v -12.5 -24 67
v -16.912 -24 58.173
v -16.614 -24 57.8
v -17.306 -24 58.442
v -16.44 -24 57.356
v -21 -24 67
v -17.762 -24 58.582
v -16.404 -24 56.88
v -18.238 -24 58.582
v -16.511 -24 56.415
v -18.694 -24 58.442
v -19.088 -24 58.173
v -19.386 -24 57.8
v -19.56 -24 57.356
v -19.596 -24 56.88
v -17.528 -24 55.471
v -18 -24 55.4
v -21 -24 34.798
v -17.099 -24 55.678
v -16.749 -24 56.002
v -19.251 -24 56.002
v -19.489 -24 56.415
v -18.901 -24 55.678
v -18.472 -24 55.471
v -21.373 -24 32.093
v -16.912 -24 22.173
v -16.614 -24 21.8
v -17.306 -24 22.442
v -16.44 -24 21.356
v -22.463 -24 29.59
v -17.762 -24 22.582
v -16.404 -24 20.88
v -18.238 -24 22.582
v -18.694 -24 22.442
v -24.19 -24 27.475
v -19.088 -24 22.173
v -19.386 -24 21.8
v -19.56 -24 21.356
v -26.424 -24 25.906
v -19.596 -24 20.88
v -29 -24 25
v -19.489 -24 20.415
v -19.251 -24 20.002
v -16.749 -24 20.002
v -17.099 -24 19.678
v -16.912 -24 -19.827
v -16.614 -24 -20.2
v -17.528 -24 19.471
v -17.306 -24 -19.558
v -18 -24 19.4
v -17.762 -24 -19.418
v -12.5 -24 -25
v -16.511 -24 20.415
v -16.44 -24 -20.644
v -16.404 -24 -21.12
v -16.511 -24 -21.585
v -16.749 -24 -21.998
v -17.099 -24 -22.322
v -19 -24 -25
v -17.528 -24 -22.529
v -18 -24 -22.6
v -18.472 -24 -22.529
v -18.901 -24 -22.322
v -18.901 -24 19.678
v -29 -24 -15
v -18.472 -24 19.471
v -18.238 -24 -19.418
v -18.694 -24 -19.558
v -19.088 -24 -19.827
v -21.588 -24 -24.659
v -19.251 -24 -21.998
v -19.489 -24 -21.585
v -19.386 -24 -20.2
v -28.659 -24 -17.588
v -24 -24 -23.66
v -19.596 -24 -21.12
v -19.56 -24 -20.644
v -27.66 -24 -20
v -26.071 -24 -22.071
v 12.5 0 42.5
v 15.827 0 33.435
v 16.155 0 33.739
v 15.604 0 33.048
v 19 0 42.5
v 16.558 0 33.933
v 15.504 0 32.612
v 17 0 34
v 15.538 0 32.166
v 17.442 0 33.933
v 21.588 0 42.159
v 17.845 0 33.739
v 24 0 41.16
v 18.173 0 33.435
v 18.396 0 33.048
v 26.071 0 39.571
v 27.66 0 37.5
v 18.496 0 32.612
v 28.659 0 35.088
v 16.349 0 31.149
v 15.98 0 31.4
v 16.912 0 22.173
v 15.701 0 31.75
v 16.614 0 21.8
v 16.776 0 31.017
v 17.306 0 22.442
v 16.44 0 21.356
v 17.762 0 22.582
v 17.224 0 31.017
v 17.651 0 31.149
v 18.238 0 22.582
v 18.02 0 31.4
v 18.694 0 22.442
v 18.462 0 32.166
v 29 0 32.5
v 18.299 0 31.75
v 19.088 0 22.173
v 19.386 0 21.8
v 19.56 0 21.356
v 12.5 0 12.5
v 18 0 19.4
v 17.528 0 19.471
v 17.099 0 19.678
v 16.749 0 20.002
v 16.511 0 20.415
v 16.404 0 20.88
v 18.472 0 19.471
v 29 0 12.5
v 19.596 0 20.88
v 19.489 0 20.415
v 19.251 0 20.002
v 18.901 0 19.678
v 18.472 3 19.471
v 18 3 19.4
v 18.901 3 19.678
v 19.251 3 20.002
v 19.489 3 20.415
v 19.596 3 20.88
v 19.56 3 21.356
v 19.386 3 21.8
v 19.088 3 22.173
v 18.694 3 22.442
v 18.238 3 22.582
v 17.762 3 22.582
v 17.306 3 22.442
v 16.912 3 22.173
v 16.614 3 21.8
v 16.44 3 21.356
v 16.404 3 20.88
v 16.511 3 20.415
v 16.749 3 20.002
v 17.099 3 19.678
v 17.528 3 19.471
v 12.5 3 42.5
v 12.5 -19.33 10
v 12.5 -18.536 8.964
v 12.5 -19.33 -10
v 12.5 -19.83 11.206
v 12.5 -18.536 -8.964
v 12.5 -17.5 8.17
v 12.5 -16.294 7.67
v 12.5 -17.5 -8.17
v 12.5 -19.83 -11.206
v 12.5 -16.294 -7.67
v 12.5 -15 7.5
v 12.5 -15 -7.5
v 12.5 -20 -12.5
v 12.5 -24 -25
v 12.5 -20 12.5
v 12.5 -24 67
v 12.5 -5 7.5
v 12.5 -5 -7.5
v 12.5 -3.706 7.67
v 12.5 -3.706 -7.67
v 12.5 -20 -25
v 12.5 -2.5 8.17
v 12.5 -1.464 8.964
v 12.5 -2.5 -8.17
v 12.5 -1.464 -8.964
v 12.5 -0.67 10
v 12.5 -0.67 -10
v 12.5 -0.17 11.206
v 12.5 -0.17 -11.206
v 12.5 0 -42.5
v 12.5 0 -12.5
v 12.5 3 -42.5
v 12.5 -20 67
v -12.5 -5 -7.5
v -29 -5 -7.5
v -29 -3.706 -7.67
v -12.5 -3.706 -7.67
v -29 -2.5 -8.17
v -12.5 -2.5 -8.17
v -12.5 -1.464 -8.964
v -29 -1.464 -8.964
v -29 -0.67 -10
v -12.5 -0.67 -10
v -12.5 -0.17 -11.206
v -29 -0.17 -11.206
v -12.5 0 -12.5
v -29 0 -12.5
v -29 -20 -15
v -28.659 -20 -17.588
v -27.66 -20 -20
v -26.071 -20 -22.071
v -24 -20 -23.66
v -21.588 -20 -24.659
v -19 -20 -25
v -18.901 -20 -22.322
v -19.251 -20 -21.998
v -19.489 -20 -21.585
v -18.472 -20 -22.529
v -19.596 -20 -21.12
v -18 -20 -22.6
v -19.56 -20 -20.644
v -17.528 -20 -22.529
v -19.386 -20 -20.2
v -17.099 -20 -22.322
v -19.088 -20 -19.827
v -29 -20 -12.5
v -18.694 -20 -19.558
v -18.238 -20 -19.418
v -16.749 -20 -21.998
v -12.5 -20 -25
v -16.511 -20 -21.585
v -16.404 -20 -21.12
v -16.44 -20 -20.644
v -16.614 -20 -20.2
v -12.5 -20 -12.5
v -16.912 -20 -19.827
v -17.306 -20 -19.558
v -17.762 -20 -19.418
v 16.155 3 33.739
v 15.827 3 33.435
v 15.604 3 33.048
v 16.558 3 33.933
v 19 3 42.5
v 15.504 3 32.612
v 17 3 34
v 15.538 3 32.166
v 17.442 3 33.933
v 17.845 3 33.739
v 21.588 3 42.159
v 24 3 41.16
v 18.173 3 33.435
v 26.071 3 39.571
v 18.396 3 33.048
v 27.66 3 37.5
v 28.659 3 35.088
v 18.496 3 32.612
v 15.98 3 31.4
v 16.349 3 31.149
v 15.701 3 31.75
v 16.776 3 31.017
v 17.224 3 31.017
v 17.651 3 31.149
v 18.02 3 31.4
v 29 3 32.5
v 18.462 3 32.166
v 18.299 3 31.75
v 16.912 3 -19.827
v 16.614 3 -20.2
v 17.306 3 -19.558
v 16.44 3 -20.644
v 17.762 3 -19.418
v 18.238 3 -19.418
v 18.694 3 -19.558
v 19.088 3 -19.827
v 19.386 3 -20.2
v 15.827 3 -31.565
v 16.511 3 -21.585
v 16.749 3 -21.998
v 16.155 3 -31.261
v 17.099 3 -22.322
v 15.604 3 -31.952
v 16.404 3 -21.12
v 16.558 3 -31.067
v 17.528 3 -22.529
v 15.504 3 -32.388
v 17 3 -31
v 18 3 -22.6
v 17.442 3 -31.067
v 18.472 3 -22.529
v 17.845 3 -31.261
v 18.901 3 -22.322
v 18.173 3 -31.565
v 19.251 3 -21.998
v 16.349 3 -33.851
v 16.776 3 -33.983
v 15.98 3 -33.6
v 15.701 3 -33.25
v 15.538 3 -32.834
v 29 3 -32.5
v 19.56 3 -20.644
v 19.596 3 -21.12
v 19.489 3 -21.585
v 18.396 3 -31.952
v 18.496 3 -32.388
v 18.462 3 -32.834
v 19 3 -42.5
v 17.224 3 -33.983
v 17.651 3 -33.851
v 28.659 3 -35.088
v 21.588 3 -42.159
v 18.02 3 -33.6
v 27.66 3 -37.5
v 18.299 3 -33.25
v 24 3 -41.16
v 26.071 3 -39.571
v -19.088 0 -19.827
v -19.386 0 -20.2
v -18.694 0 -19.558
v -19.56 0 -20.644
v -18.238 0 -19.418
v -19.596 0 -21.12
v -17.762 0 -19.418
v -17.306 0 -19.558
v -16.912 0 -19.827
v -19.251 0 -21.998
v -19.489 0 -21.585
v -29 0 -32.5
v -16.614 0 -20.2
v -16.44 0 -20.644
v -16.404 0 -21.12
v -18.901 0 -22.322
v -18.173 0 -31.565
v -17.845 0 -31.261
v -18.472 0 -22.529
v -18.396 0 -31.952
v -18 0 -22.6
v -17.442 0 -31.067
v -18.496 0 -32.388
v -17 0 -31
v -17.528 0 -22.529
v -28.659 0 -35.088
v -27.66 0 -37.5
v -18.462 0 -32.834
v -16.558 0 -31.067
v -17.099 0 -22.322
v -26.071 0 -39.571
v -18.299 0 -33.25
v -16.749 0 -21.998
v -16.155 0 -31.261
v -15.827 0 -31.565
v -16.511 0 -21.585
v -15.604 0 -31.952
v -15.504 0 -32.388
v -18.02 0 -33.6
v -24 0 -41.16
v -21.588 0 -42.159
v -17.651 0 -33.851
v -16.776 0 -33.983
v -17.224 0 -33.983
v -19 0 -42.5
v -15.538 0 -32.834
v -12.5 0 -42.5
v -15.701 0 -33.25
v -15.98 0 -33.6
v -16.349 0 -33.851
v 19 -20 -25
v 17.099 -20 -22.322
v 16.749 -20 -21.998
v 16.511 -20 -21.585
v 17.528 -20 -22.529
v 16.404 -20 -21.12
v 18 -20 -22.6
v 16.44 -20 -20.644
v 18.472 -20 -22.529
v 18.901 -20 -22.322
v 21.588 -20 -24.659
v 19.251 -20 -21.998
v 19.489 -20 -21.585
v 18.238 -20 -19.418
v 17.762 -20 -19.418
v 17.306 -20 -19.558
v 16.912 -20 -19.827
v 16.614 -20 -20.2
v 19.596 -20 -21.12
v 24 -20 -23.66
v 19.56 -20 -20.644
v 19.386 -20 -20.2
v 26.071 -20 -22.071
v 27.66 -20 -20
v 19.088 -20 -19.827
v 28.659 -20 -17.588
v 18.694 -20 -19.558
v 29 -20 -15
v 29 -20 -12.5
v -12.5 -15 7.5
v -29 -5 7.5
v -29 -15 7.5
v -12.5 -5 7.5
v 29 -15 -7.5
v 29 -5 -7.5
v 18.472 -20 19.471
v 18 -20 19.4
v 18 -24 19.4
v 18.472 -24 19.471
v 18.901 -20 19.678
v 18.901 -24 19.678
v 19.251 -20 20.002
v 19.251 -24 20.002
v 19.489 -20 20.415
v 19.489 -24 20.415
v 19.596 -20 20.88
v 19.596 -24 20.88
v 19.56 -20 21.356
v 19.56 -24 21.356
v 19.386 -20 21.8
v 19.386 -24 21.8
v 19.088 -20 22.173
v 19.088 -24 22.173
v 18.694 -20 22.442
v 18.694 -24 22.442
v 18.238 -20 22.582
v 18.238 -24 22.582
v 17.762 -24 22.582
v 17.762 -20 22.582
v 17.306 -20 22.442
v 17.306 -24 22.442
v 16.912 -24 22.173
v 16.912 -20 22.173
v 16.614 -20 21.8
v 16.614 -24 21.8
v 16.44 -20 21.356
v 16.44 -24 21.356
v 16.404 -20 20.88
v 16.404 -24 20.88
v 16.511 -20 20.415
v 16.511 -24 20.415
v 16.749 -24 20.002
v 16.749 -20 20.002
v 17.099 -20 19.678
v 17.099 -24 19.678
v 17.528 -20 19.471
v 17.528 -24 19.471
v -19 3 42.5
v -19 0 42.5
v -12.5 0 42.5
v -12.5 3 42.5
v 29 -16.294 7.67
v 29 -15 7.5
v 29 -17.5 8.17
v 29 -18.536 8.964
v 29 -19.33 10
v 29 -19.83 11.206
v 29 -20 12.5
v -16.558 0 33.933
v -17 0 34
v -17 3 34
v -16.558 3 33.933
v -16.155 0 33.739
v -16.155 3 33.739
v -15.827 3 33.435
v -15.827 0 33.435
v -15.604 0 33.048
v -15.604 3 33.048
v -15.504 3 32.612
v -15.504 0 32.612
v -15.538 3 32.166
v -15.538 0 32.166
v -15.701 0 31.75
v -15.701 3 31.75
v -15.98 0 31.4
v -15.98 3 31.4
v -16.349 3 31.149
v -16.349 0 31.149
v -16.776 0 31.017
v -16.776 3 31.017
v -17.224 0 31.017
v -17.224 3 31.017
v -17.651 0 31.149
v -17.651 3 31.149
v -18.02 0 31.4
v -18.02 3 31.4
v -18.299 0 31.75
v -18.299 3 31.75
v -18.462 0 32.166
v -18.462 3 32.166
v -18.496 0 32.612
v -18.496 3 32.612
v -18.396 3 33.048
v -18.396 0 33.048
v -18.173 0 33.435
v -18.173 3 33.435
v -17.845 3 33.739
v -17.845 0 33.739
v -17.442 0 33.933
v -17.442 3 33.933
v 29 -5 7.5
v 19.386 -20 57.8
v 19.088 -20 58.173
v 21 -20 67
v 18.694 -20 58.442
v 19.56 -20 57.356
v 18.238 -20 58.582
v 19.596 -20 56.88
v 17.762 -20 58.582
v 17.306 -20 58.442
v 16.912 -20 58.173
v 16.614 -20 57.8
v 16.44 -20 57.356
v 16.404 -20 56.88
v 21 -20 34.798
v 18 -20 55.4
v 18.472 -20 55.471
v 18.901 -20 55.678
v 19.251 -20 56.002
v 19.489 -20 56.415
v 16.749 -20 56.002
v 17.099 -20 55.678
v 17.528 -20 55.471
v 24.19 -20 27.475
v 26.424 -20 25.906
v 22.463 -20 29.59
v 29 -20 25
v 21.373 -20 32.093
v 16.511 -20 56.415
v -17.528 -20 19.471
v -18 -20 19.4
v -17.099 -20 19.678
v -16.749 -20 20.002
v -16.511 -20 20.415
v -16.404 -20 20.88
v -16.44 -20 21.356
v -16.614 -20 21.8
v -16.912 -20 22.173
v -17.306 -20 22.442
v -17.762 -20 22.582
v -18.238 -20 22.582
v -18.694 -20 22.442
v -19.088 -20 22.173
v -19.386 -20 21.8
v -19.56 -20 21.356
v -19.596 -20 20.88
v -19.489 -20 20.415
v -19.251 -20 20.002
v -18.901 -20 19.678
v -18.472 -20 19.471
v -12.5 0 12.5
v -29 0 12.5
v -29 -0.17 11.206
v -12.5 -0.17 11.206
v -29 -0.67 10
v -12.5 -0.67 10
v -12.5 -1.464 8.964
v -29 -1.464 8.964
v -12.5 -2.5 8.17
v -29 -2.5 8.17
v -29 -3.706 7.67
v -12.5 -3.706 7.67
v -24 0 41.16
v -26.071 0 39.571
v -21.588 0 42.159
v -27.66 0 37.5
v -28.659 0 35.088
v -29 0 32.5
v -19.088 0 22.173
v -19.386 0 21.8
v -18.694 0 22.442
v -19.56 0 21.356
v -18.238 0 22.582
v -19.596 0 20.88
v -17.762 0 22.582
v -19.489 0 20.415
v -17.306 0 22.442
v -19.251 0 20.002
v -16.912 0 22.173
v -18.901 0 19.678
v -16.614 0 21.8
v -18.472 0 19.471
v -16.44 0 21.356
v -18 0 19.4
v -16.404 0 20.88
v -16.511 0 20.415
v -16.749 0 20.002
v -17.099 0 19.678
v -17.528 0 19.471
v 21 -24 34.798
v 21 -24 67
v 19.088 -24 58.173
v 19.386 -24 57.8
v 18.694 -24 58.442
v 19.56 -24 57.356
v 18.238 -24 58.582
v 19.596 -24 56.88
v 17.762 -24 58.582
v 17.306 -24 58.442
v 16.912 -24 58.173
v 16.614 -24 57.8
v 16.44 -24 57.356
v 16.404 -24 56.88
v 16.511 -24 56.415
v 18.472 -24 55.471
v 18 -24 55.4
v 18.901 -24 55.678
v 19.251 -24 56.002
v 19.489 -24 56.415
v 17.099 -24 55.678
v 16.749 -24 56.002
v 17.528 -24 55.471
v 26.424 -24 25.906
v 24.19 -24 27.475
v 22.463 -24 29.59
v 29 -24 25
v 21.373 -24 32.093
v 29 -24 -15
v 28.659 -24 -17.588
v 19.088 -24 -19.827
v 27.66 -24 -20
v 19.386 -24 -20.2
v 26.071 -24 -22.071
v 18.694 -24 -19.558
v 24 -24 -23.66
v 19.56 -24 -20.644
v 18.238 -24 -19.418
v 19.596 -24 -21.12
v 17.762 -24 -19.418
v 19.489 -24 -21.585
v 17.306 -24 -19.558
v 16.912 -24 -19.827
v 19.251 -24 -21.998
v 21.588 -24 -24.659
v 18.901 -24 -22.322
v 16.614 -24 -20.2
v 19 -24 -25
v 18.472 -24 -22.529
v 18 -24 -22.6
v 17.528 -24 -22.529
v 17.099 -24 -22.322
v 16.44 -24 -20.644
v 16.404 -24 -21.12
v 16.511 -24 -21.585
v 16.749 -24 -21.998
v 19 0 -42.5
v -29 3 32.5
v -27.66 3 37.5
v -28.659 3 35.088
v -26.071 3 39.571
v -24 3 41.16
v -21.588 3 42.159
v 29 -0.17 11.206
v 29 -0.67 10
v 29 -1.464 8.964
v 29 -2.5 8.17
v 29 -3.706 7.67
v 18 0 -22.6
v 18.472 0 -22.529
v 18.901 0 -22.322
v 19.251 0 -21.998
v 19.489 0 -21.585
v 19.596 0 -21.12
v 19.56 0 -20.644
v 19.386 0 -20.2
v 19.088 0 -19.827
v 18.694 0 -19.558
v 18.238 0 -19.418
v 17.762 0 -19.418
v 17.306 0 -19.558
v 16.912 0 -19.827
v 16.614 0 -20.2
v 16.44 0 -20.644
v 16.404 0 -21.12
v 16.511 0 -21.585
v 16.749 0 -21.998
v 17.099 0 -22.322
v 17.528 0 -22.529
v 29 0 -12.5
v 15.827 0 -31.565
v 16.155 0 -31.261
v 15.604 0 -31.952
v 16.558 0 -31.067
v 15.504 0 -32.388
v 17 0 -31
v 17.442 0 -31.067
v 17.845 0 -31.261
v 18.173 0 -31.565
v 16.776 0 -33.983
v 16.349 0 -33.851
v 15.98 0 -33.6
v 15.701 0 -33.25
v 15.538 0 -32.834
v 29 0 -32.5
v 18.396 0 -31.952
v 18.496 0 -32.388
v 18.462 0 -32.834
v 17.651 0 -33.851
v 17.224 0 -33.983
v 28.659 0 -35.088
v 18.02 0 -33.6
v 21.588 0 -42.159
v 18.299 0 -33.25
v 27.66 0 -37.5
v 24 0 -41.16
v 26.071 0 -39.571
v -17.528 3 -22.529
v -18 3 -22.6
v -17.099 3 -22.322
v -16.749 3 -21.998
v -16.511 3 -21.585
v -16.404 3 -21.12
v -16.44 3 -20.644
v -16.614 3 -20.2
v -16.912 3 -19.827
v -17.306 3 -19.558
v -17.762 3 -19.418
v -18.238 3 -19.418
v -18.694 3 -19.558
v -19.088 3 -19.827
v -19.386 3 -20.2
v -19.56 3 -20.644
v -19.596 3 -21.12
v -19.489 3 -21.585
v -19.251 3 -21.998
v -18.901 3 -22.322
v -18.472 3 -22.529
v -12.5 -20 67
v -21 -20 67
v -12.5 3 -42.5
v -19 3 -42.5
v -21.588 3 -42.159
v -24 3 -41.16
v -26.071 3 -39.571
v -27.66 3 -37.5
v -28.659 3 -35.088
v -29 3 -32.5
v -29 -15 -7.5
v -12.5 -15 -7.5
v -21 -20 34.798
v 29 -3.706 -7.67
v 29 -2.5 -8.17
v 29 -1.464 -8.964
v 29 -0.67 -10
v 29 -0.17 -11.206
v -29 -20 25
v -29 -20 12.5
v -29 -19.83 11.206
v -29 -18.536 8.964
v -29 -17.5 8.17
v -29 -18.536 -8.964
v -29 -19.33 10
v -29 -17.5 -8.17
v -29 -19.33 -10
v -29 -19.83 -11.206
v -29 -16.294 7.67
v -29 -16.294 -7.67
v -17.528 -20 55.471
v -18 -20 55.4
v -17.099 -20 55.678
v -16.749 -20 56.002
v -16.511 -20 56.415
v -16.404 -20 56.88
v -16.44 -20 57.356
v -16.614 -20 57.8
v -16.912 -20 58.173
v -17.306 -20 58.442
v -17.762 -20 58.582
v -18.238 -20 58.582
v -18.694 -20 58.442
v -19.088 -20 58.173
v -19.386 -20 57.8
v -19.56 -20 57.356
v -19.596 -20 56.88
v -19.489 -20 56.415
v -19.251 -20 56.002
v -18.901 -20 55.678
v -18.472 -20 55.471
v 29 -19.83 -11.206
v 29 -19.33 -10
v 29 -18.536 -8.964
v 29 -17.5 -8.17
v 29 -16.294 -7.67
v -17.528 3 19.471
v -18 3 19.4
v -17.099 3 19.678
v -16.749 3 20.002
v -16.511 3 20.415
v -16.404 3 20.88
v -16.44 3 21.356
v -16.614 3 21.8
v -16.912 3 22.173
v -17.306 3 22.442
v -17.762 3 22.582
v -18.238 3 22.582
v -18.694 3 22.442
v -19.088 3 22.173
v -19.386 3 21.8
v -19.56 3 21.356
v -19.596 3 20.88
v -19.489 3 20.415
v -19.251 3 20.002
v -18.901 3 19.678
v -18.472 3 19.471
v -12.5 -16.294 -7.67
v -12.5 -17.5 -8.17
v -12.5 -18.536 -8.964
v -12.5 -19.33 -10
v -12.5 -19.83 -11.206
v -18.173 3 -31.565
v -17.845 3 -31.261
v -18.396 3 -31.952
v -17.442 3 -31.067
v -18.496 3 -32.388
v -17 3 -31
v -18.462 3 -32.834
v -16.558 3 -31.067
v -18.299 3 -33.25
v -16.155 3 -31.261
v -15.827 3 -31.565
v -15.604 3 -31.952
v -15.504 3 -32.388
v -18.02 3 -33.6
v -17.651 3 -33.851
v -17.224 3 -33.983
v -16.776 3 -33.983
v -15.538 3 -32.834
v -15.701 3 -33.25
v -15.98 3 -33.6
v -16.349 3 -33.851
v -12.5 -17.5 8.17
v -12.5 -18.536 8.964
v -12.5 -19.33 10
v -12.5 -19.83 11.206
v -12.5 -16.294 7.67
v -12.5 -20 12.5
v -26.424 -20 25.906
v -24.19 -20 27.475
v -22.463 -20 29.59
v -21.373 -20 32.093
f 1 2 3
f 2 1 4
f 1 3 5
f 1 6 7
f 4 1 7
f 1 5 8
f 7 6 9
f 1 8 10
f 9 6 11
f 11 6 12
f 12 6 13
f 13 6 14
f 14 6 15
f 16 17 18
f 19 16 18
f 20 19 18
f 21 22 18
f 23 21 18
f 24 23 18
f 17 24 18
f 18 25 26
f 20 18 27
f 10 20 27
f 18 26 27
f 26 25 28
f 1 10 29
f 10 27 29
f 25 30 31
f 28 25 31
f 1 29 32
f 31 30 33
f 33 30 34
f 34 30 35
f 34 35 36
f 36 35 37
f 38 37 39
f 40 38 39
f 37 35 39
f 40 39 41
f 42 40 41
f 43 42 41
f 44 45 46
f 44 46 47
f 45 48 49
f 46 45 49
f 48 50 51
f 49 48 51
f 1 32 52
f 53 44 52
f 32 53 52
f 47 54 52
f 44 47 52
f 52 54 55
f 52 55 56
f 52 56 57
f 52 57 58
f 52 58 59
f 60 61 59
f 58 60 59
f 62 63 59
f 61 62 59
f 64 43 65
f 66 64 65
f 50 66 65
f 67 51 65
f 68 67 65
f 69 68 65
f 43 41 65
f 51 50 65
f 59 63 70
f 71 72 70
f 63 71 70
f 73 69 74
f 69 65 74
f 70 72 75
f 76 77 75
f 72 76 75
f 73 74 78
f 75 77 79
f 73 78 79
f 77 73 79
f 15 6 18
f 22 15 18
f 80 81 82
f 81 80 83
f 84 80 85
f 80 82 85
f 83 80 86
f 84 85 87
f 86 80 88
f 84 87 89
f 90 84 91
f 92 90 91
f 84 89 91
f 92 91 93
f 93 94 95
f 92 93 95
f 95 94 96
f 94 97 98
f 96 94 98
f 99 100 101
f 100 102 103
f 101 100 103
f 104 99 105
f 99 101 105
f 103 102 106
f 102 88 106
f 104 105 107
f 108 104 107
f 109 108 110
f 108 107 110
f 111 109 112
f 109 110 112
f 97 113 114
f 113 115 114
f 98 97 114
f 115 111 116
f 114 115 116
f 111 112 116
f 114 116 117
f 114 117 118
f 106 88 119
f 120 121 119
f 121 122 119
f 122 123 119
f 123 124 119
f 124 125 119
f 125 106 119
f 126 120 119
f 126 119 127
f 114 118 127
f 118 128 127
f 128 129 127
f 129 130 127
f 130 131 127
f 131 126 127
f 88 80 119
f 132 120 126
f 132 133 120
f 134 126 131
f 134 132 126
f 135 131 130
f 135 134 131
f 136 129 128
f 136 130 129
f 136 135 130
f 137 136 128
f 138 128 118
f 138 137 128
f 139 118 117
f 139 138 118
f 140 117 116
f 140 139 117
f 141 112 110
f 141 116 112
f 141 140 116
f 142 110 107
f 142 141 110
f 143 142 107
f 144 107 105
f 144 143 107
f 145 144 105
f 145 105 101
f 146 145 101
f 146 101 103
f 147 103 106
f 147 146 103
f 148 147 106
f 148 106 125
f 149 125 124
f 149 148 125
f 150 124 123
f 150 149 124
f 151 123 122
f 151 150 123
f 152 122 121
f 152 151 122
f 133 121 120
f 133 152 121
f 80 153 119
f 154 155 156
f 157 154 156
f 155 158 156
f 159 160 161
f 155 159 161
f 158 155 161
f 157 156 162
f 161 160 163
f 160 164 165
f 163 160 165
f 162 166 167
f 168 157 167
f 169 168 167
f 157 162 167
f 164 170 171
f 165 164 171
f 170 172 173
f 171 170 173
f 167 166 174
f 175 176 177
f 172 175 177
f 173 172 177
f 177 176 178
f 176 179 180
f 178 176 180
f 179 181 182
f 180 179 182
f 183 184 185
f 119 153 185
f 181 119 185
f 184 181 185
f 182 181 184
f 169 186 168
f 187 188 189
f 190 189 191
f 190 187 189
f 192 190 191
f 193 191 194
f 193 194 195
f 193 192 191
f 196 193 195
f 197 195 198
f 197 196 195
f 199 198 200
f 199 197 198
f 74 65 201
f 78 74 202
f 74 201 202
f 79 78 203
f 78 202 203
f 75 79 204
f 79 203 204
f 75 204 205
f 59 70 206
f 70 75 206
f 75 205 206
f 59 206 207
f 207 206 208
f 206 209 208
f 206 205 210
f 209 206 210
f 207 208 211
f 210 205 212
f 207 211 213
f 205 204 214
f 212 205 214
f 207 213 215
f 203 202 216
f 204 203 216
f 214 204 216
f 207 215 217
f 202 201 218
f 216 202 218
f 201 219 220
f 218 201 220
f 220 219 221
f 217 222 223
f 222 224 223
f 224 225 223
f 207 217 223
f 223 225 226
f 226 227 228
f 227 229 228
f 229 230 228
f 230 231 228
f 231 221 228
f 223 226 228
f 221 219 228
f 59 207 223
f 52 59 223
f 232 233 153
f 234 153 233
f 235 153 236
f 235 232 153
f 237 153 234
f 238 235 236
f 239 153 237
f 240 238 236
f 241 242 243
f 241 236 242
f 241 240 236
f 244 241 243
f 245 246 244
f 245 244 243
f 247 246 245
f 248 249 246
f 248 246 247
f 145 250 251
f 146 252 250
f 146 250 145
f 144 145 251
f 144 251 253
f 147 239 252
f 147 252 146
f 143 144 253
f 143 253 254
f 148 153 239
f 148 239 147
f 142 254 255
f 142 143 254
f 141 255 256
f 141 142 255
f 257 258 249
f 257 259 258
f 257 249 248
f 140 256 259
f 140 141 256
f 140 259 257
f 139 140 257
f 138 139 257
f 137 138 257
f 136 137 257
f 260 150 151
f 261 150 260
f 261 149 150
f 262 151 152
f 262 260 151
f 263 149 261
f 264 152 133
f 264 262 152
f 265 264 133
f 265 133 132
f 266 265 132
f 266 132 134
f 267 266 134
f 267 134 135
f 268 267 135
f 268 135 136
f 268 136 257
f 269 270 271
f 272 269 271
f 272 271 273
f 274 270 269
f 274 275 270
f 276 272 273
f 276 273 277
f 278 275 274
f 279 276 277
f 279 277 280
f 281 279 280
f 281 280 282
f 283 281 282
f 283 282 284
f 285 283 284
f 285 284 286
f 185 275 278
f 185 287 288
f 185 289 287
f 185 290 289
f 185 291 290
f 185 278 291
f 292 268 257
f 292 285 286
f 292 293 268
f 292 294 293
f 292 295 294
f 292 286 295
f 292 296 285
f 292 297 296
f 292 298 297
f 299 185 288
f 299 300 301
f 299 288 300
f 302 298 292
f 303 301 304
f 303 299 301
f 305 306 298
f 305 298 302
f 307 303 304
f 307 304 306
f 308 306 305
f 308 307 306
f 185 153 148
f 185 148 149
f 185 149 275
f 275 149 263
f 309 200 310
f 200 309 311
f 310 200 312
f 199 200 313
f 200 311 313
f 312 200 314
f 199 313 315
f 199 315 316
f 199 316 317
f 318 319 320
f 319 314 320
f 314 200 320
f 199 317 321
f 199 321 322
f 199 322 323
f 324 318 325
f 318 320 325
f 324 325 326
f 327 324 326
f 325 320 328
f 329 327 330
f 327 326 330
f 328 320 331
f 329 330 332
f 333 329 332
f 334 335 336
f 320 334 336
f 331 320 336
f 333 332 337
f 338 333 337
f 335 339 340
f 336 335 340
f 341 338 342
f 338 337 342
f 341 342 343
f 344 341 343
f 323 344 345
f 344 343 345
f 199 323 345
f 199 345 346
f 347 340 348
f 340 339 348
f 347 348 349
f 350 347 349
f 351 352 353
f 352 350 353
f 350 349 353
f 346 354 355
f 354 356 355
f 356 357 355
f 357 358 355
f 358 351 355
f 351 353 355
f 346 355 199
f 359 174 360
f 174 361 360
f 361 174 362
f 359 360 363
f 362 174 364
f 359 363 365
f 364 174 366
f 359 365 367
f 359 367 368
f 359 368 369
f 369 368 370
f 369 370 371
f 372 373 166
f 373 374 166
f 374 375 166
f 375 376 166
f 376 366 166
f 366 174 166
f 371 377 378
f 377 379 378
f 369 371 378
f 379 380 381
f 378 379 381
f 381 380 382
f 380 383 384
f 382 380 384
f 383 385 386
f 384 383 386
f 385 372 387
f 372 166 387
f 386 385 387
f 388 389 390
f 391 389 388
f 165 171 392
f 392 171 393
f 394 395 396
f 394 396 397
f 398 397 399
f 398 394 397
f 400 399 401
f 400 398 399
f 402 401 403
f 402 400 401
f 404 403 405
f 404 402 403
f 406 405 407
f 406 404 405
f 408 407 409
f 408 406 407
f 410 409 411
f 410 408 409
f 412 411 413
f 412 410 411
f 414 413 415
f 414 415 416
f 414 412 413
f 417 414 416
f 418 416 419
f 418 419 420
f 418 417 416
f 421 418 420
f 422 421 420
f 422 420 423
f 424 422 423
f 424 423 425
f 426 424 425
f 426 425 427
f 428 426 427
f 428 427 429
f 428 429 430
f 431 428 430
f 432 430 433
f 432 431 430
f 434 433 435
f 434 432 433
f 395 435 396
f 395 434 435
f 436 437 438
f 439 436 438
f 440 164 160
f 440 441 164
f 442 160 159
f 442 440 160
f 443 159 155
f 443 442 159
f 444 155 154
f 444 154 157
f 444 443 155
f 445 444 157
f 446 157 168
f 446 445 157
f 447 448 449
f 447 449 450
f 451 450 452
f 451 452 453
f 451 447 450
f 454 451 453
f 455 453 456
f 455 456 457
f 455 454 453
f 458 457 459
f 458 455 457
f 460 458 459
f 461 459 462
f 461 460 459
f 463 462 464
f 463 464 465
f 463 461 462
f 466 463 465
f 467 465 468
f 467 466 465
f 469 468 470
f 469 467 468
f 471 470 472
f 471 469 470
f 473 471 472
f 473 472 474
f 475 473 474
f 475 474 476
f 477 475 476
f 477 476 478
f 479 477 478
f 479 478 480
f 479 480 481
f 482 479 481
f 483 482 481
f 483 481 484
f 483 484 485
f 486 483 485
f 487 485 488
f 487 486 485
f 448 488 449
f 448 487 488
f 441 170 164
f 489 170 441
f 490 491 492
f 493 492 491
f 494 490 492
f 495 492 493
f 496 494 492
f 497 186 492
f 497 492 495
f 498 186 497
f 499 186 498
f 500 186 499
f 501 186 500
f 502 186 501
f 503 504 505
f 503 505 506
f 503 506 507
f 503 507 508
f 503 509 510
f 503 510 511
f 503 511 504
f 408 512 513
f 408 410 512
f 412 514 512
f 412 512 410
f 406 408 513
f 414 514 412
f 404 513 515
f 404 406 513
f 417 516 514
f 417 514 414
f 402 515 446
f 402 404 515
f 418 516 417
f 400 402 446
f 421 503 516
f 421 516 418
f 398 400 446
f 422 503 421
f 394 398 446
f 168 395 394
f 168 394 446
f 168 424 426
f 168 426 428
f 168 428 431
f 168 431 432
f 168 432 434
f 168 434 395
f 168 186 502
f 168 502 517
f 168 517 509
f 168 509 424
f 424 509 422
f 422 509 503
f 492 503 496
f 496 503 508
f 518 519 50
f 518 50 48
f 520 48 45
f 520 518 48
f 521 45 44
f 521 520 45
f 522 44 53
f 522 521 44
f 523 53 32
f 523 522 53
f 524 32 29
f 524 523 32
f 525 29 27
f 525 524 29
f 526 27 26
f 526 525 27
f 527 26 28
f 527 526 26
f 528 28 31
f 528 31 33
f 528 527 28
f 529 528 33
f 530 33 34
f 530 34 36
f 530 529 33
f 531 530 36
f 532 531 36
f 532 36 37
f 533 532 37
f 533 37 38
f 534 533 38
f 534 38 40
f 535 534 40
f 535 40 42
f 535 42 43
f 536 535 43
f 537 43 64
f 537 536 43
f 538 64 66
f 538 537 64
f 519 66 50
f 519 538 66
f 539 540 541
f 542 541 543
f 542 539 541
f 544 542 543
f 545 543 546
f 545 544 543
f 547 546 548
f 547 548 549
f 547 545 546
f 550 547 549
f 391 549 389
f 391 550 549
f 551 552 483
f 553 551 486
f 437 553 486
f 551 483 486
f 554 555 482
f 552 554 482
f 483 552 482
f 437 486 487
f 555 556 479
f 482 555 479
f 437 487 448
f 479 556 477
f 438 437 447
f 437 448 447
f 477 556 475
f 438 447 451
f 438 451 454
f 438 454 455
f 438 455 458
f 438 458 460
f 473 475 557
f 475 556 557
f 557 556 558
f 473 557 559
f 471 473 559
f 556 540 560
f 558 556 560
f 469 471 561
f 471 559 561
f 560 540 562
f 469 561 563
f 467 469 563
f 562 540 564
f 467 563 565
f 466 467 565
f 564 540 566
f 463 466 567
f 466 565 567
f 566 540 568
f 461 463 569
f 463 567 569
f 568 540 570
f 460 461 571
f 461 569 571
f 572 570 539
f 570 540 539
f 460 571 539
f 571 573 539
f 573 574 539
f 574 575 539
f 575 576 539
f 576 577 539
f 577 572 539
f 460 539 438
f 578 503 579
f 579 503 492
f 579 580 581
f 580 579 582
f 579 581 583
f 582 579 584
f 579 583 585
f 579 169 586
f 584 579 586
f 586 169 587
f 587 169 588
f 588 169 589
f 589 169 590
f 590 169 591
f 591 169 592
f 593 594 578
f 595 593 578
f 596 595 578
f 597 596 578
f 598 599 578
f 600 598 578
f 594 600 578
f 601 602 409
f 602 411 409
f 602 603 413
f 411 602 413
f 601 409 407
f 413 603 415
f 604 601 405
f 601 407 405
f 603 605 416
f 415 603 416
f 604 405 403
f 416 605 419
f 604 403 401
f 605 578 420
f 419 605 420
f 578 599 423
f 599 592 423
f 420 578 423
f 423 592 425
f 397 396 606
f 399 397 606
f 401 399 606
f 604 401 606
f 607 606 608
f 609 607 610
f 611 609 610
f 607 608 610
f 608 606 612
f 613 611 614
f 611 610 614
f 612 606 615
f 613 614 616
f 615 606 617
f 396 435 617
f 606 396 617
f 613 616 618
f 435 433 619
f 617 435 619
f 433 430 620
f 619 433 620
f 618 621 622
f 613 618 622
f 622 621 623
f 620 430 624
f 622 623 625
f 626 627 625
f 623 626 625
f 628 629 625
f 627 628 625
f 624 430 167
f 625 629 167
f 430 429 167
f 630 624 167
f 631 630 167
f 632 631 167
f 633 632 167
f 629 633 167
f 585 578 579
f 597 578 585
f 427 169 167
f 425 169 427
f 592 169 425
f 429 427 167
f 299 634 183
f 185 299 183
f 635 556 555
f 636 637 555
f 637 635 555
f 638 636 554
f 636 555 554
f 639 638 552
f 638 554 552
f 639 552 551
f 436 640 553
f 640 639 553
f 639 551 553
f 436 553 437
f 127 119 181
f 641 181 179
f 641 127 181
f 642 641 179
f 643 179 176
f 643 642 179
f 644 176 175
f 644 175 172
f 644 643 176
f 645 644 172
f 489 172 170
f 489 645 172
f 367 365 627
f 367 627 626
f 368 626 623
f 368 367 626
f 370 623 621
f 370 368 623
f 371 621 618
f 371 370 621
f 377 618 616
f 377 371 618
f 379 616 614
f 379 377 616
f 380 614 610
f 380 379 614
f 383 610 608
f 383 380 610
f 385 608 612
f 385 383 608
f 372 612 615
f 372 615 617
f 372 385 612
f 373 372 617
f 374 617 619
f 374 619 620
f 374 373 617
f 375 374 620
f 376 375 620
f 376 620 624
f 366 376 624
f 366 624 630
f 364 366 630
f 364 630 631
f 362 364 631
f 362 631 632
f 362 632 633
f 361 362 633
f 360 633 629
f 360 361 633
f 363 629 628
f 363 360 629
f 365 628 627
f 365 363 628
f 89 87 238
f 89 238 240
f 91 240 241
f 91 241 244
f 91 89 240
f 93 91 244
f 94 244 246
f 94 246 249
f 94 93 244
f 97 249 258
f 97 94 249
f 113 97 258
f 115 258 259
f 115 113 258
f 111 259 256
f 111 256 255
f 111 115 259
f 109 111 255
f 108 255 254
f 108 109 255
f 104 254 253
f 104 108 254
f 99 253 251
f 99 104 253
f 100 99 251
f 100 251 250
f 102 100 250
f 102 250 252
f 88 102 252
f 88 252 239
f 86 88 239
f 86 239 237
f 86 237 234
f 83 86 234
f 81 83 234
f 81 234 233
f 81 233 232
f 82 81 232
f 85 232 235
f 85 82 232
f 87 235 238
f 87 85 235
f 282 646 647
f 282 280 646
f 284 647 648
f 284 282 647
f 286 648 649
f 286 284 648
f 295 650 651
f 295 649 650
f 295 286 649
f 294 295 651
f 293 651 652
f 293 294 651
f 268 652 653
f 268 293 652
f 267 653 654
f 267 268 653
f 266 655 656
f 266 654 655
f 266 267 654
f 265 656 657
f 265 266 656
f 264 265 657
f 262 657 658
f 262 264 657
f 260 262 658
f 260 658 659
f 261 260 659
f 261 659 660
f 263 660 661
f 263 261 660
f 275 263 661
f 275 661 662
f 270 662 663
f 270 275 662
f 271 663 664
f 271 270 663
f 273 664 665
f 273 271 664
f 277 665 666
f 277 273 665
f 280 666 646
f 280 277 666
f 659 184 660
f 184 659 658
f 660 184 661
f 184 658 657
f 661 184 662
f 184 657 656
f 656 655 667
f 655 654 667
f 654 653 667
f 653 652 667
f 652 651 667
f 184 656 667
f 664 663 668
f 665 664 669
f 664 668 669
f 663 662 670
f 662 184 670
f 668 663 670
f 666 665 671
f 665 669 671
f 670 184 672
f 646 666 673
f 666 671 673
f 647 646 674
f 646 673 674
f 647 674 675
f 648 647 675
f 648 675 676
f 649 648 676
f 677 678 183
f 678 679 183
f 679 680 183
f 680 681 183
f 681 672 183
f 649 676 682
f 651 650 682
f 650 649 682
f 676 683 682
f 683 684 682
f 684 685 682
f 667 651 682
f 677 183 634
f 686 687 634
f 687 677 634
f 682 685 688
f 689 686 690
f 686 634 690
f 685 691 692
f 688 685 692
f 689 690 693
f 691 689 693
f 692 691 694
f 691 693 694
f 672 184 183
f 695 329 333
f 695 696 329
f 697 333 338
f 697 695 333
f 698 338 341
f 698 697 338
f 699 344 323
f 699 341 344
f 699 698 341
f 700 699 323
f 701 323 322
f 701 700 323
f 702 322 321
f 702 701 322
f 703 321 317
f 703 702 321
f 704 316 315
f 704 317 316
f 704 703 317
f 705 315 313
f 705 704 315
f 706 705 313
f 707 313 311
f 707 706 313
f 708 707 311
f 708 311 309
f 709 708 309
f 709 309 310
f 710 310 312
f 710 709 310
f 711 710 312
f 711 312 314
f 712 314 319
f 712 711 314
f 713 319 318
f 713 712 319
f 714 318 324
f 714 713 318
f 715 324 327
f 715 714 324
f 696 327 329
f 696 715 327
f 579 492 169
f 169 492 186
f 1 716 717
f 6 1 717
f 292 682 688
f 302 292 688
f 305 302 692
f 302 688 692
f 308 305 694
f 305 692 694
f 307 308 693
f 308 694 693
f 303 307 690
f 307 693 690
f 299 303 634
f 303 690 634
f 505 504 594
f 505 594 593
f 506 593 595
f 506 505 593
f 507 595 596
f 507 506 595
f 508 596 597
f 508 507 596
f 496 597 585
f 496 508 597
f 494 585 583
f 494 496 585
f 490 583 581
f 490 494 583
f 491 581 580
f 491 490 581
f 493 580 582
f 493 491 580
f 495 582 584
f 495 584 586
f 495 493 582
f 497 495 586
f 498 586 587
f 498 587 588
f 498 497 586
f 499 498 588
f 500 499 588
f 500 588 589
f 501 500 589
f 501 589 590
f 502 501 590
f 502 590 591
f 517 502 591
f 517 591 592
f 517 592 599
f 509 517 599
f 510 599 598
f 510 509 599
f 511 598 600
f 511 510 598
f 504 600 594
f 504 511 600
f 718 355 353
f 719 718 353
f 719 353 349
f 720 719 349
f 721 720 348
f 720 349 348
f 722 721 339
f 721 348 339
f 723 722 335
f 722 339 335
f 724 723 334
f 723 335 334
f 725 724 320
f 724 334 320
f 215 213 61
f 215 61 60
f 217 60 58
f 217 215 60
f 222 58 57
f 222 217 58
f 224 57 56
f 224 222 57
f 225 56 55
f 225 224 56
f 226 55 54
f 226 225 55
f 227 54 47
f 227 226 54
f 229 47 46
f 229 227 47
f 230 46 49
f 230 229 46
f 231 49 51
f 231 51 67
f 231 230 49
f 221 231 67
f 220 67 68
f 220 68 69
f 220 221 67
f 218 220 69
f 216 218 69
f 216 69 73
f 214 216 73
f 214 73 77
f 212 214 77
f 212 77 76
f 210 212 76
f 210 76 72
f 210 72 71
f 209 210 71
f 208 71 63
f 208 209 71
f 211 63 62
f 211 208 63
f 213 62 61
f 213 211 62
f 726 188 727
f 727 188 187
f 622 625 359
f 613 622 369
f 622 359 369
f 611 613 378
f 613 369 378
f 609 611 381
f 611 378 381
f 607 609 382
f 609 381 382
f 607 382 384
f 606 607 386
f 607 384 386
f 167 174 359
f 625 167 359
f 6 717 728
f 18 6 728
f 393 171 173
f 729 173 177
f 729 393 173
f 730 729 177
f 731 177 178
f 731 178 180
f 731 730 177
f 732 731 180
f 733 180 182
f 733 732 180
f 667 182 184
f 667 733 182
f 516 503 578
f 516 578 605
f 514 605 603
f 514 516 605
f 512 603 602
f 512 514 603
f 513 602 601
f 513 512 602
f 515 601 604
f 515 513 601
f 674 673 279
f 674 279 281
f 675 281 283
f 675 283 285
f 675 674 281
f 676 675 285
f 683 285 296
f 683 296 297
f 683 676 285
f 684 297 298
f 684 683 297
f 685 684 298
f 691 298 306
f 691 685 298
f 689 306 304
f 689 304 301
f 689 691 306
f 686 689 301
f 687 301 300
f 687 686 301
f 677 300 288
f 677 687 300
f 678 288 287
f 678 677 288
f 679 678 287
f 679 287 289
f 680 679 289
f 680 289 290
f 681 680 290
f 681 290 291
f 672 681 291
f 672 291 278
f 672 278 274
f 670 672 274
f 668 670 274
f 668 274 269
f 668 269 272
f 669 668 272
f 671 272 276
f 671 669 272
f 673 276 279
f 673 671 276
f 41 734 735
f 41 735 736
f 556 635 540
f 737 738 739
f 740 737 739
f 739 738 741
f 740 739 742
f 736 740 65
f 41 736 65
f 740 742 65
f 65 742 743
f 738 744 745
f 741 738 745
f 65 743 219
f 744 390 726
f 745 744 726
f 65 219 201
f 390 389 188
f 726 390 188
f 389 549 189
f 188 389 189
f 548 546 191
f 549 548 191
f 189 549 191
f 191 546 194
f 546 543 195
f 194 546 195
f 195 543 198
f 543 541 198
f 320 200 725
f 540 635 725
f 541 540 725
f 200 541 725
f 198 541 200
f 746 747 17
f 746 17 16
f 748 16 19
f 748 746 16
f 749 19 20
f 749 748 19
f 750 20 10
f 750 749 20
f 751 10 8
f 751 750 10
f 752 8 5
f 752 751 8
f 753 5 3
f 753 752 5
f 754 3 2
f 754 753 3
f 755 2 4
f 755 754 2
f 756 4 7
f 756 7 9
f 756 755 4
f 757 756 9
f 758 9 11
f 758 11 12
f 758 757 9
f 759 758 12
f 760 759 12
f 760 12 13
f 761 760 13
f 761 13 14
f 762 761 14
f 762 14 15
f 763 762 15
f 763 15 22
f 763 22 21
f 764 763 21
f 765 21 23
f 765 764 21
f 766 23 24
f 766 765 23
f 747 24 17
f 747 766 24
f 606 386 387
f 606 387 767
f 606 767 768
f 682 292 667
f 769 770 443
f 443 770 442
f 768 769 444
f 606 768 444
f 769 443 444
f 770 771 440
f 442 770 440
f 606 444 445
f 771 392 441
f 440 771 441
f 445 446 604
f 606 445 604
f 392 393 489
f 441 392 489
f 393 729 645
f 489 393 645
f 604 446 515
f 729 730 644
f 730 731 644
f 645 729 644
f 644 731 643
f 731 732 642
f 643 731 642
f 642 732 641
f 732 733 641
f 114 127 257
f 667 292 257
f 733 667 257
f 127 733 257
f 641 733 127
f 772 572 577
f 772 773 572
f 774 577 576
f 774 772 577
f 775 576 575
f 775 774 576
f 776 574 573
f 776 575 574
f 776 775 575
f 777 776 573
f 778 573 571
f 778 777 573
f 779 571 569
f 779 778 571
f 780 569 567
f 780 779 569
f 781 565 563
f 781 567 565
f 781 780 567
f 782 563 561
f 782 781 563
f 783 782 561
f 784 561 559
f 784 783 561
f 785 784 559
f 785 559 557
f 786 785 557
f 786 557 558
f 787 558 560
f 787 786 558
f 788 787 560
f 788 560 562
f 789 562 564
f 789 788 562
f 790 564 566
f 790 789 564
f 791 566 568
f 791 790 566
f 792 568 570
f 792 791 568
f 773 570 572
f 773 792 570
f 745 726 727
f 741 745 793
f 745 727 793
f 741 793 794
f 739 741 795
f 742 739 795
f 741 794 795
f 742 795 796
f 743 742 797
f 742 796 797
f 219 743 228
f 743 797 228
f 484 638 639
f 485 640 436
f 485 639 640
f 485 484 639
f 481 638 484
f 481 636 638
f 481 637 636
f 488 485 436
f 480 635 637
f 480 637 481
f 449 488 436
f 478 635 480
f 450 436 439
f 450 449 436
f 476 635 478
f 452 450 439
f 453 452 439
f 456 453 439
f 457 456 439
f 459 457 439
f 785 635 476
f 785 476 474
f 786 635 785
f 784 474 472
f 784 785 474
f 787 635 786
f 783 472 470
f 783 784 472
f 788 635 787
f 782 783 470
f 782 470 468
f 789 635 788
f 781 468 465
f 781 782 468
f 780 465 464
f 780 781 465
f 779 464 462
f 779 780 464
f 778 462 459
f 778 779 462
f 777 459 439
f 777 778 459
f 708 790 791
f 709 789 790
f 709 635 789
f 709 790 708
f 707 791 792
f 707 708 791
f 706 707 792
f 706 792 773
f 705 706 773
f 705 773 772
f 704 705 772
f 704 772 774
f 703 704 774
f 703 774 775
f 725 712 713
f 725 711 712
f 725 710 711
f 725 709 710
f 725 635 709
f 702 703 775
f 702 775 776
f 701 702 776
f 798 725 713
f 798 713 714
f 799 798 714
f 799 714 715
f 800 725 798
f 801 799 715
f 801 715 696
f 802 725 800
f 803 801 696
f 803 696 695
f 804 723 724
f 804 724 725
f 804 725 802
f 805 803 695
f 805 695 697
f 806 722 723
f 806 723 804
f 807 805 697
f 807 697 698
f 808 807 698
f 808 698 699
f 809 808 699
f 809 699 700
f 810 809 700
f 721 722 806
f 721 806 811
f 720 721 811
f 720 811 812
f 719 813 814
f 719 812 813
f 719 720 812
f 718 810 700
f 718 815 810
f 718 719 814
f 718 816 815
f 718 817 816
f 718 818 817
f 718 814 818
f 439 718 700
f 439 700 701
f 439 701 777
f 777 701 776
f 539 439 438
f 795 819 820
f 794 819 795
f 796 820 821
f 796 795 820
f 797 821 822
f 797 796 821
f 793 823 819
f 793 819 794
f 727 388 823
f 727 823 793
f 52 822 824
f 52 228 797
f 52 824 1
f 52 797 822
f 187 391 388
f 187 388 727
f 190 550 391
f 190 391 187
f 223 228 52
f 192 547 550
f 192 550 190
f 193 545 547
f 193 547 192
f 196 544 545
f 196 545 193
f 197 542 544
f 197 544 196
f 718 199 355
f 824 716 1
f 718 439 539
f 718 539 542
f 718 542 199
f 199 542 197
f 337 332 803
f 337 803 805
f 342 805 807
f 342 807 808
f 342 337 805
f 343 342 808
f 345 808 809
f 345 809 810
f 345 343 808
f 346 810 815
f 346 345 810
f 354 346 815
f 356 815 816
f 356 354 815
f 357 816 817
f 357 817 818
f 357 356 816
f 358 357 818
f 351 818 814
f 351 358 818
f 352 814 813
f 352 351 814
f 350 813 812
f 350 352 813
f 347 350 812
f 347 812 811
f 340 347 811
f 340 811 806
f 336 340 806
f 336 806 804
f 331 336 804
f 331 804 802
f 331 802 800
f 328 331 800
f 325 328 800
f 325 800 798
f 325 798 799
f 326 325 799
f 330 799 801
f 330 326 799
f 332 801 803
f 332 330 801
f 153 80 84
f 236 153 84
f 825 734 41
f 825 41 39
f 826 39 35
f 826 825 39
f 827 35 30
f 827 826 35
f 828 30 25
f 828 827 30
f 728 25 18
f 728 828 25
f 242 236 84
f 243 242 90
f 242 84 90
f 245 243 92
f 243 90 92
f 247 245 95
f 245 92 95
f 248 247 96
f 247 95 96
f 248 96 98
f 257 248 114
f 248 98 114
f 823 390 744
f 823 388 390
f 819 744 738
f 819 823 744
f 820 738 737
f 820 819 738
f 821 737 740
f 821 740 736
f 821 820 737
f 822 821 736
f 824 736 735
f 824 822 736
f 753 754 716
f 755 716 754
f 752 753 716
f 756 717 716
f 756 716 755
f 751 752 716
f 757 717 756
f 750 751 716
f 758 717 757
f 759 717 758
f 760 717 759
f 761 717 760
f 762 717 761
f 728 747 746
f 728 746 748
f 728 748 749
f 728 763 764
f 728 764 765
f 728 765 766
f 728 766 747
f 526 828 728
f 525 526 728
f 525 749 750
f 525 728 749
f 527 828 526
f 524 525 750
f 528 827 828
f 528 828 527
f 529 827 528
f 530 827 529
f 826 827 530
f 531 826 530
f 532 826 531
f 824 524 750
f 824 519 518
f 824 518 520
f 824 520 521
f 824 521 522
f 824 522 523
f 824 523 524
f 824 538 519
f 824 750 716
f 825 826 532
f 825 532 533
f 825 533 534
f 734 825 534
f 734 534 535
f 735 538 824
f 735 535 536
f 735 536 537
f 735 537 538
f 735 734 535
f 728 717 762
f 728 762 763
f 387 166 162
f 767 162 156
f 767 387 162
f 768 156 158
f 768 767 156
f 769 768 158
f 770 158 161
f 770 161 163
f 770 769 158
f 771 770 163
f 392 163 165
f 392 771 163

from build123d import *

# Parameters (mm, degrees)
SKETCH_1_R          = 1.5
EXTRUDE_1_DEPTH     = 3
SKETCH_4_W          = 58
SKETCH_4_H          = 15
EXTRUDE_2_DEPTH     = 20
SKETCH_5_R          = 1.6
EXTRUDE_3_DEPTH     = 4
FILLET_1_R          = 10
CUT_EXTRUDE_START   = -63
SKETCH_6_R          = 1.6
CUT_EXTRUDE_2_DEPTH = 63
SKETCH_7_W          = 25
SKETCH_7_H          = 85
CUT_EXTRUDE_3_DEPTH = 63
SKETCH_8_W          = 25
SKETCH_8_H          = 24.5
CUT_EXTRUDE_4_DEPTH = 63
FILLET_2_R          = 5
FILLET_3_R          = 5
FILLET_4_R          = 5


with BuildPart() as part:
    # 草图1 → 凸台-拉伸1 (new body)
    with BuildSketch(Plane(origin=(0, 0, 0), x_dir=(1, 0, 0), z_dir=(0, 1, 0))):
        with BuildLine():
            Line((-29, -42.5), (29, -42.5))
            Line((29, -42.5), (29, 32.5))
            ThreePointArc((29, 32.5), (26.071067812, 39.571067812), (19, 42.5))
            Line((19, 42.5), (-19, 42.5))
            ThreePointArc((-19, 42.5), (-26.071067812, 39.571067812), (-29, 32.5))
            Line((-29, 32.5), (-29, -42.5))
        make_face()
        with Locations(Location((17, 32.5, 0), (0, 0, 270))):
            Circle(SKETCH_1_R, mode=Mode.SUBTRACT)
        with Locations(Location((-17, 32.5, 0), (0, 0, 270))):
            Circle(SKETCH_1_R, mode=Mode.SUBTRACT)
        with Locations(Location((-17, -32.5, 0), (0, 0, 270))):
            Circle(SKETCH_1_R, mode=Mode.SUBTRACT)
        with Locations(Location((17, -32.5, 0), (0, 0, 270))):
            Circle(SKETCH_1_R, mode=Mode.SUBTRACT)
    extrude(amount=EXTRUDE_1_DEPTH)

    # 草图4 → 凸台-拉伸2 (add)
    with BuildSketch(Plane.XZ):
        Rectangle(SKETCH_4_W, SKETCH_4_H)
    extrude(amount=EXTRUDE_2_DEPTH)

    # 草图5 → 凸台-拉伸3 (add)
    with BuildSketch(Plane.XZ.offset(20)):
        Polygon((21, 25), (21, 67), (-21, 67), (-21, 25), (-29, 25), (-29, -25), (29, -25), (29, 25), align=None)
        with Locations(Location((-18, -21, 0), (0, 0, 270))):
            Circle(SKETCH_5_R, mode=Mode.SUBTRACT)
        with Locations(Location((-18, 21, 0), (0, 0, 270))):
            Circle(SKETCH_5_R, mode=Mode.SUBTRACT)
        with Locations(Location((18, 21, 0), (0, 0, 270))):
            Circle(SKETCH_5_R, mode=Mode.SUBTRACT)
        with Locations(Location((18, -21, 0), (0, 0, 270))):
            Circle(SKETCH_5_R, mode=Mode.SUBTRACT)
        with Locations(Location((-18, 57, 0), (0, 0, 270))):
            Circle(SKETCH_5_R, mode=Mode.SUBTRACT)
        with Locations(Location((18, 57, 0), (0, 0, 270))):
            Circle(SKETCH_5_R, mode=Mode.SUBTRACT)
    extrude(amount=EXTRUDE_3_DEPTH)

    # 圆角1
    # the kernel refuses this fillet: 10 mm, written as the material it adds along each edge
    with BuildSketch(Plane(origin=(-21, -20, 25), x_dir=(0, 0, 1), z_dir=(0, -1, 0))) as fillet_1_piece_1:
        with BuildLine():
            CenterArc((9.797958971, 10), FILLET_1_R, 191.536959033, 78.463040967)
            Line((0, 8), (0, 0))
            Line((0, 0), (9.797958971, 0))
        make_face()
    extrude(amount=4)
    with BuildSketch(Plane(origin=(21, -20, 25), x_dir=(0, 0, 1), z_dir=(0, -1, 0))) as fillet_1_piece_2:
        with BuildLine():
            CenterArc((9.797958971, -10), FILLET_1_R, 90, 78.463040967)
            Line((0, -8), (0, 0))
            Line((0, 0), (9.797958971, 0))
        make_face()
    extrude(amount=4)
    # the kernel refuses this fillet: 10 mm, written as the material it takes off along each edge
    with BuildSketch(Plane(origin=(29, 0, 42.5), x_dir=(0, 0, -1), z_dir=(0, 1, 0))) as fillet_1_2_piece_1:
        with BuildLine():
            CenterArc((FILLET_1_R, FILLET_1_R), FILLET_1_R, 180, 90)
            Line((0, FILLET_1_R), (0, 0))
            Line((0, 0), (FILLET_1_R, 0))
        make_face()
    extrude(amount=28, mode=Mode.SUBTRACT)
    with BuildSketch(Plane(origin=(-29, 0, 42.5), x_dir=(0, 0, -1), z_dir=(0, 1, 0))) as fillet_1_2_piece_2:
        with BuildLine():
            CenterArc((FILLET_1_R, -FILLET_1_R), FILLET_1_R, 90, 90)
            Line((0, -FILLET_1_R), (0, 0))
            Line((0, 0), (FILLET_1_R, 0))
        make_face()
    extrude(amount=28, mode=Mode.SUBTRACT)
    with BuildSketch(Plane(origin=(-29, -20, -25), x_dir=(0, 0, 1), z_dir=(0, -1, 0))) as fillet_1_2_piece_3:
        with BuildLine():
            CenterArc((FILLET_1_R, -FILLET_1_R), FILLET_1_R, 90, 90)
            Line((0, -FILLET_1_R), (0, 0))
            Line((0, 0), (FILLET_1_R, 0))
        make_face()
    extrude(amount=29, mode=Mode.SUBTRACT)
    with BuildSketch(Plane(origin=(29, -20, -25), x_dir=(0, 0, 1), z_dir=(0, -1, 0))) as fillet_1_2_piece_4:
        with BuildLine():
            CenterArc((FILLET_1_R, FILLET_1_R), FILLET_1_R, 180, 90)
            Line((0, FILLET_1_R), (0, 0))
            Line((0, 0), (FILLET_1_R, 0))
        make_face()
    extrude(amount=29, mode=Mode.SUBTRACT)

    # 草图6 → 切除-拉伸2 (cut)
    with BuildSketch(Plane.XZ.offset(24).offset(CUT_EXTRUDE_START)):
        with Locations(Location((18, 21, 0), (0, 0, 270))):
            Circle(SKETCH_6_R)
        with Locations(Location((18, -21, 0), (0, 0, 270))):
            Circle(SKETCH_6_R)
        with Locations(Location((-18, -21, 0), (0, 0, 270))):
            Circle(SKETCH_6_R)
        with Locations(Location((-18, 21, 0), (0, 0, 270))):
            Circle(SKETCH_6_R)
    extrude(amount=CUT_EXTRUDE_2_DEPTH, mode=Mode.SUBTRACT)

    # 草图7 → 切除-拉伸3 (cut)
    with BuildSketch(Plane(origin=(0, 3, 0), x_dir=(1, 0, 0), z_dir=(0, 1, 0))):
        Rectangle(SKETCH_7_W, SKETCH_7_H)
    extrude(amount=-CUT_EXTRUDE_3_DEPTH, mode=Mode.SUBTRACT)

    # 草图8 → 切除-拉伸4 (cut)
    with BuildSketch(Plane(origin=(0, -20, 0), x_dir=(1, 0, 0), z_dir=(0, 1, 0))):
        with Locations((0, -54.75)):
            Rectangle(SKETCH_8_W, SKETCH_8_H)
    extrude(amount=-CUT_EXTRUDE_4_DEPTH, mode=Mode.SUBTRACT)


with BuildPart() as cut_extrude_4_piece_1:
    # of the separate pieces the step leaves, piece 1, a body of its own (cut_extrude_4_pieces)
    add(part.part.solids().sort_by_distance((-12.5, -20, 67))[0])

    # 圆角2
    fillet_2_edges = [cut_extrude_4_piece_1.edges().sort_by_distance(p)[0] for p in [
        (-20.75, 0, 7.5),
        (-20.75, 0, -7.5),
    ]]
    fillet(fillet_2_edges, radius=FILLET_2_R)

    # 圆角4
    fillet_4_edges = [cut_extrude_4_piece_1.edges().sort_by_distance(p)[0] for p in [
        (-20.75, -20, 7.5),
        (-20.75, -20, -7.5),
    ]]
    fillet(fillet_4_edges, radius=FILLET_4_R)


with BuildPart() as cut_extrude_4_piece_2:
    # of the separate pieces the step leaves, piece 2, a body of its own (cut_extrude_4_pieces)
    add(part.part.solids().sort_by_distance((21, -20, 34.797958971))[0])

    # 圆角3
    fillet_3_edges = [cut_extrude_4_piece_2.edges().sort_by_distance(p)[0] for p in [
        (20.75, 0, 7.5),
        (20.75, 0, -7.5),
        (20.75, -20, -7.5),
        (20.75, -20, 7.5),
    ]]
    fillet(fillet_3_edges, radius=FILLET_3_R)


solid = Compound([cut_extrude_4_piece_1.part, cut_extrude_4_piece_2.part])
